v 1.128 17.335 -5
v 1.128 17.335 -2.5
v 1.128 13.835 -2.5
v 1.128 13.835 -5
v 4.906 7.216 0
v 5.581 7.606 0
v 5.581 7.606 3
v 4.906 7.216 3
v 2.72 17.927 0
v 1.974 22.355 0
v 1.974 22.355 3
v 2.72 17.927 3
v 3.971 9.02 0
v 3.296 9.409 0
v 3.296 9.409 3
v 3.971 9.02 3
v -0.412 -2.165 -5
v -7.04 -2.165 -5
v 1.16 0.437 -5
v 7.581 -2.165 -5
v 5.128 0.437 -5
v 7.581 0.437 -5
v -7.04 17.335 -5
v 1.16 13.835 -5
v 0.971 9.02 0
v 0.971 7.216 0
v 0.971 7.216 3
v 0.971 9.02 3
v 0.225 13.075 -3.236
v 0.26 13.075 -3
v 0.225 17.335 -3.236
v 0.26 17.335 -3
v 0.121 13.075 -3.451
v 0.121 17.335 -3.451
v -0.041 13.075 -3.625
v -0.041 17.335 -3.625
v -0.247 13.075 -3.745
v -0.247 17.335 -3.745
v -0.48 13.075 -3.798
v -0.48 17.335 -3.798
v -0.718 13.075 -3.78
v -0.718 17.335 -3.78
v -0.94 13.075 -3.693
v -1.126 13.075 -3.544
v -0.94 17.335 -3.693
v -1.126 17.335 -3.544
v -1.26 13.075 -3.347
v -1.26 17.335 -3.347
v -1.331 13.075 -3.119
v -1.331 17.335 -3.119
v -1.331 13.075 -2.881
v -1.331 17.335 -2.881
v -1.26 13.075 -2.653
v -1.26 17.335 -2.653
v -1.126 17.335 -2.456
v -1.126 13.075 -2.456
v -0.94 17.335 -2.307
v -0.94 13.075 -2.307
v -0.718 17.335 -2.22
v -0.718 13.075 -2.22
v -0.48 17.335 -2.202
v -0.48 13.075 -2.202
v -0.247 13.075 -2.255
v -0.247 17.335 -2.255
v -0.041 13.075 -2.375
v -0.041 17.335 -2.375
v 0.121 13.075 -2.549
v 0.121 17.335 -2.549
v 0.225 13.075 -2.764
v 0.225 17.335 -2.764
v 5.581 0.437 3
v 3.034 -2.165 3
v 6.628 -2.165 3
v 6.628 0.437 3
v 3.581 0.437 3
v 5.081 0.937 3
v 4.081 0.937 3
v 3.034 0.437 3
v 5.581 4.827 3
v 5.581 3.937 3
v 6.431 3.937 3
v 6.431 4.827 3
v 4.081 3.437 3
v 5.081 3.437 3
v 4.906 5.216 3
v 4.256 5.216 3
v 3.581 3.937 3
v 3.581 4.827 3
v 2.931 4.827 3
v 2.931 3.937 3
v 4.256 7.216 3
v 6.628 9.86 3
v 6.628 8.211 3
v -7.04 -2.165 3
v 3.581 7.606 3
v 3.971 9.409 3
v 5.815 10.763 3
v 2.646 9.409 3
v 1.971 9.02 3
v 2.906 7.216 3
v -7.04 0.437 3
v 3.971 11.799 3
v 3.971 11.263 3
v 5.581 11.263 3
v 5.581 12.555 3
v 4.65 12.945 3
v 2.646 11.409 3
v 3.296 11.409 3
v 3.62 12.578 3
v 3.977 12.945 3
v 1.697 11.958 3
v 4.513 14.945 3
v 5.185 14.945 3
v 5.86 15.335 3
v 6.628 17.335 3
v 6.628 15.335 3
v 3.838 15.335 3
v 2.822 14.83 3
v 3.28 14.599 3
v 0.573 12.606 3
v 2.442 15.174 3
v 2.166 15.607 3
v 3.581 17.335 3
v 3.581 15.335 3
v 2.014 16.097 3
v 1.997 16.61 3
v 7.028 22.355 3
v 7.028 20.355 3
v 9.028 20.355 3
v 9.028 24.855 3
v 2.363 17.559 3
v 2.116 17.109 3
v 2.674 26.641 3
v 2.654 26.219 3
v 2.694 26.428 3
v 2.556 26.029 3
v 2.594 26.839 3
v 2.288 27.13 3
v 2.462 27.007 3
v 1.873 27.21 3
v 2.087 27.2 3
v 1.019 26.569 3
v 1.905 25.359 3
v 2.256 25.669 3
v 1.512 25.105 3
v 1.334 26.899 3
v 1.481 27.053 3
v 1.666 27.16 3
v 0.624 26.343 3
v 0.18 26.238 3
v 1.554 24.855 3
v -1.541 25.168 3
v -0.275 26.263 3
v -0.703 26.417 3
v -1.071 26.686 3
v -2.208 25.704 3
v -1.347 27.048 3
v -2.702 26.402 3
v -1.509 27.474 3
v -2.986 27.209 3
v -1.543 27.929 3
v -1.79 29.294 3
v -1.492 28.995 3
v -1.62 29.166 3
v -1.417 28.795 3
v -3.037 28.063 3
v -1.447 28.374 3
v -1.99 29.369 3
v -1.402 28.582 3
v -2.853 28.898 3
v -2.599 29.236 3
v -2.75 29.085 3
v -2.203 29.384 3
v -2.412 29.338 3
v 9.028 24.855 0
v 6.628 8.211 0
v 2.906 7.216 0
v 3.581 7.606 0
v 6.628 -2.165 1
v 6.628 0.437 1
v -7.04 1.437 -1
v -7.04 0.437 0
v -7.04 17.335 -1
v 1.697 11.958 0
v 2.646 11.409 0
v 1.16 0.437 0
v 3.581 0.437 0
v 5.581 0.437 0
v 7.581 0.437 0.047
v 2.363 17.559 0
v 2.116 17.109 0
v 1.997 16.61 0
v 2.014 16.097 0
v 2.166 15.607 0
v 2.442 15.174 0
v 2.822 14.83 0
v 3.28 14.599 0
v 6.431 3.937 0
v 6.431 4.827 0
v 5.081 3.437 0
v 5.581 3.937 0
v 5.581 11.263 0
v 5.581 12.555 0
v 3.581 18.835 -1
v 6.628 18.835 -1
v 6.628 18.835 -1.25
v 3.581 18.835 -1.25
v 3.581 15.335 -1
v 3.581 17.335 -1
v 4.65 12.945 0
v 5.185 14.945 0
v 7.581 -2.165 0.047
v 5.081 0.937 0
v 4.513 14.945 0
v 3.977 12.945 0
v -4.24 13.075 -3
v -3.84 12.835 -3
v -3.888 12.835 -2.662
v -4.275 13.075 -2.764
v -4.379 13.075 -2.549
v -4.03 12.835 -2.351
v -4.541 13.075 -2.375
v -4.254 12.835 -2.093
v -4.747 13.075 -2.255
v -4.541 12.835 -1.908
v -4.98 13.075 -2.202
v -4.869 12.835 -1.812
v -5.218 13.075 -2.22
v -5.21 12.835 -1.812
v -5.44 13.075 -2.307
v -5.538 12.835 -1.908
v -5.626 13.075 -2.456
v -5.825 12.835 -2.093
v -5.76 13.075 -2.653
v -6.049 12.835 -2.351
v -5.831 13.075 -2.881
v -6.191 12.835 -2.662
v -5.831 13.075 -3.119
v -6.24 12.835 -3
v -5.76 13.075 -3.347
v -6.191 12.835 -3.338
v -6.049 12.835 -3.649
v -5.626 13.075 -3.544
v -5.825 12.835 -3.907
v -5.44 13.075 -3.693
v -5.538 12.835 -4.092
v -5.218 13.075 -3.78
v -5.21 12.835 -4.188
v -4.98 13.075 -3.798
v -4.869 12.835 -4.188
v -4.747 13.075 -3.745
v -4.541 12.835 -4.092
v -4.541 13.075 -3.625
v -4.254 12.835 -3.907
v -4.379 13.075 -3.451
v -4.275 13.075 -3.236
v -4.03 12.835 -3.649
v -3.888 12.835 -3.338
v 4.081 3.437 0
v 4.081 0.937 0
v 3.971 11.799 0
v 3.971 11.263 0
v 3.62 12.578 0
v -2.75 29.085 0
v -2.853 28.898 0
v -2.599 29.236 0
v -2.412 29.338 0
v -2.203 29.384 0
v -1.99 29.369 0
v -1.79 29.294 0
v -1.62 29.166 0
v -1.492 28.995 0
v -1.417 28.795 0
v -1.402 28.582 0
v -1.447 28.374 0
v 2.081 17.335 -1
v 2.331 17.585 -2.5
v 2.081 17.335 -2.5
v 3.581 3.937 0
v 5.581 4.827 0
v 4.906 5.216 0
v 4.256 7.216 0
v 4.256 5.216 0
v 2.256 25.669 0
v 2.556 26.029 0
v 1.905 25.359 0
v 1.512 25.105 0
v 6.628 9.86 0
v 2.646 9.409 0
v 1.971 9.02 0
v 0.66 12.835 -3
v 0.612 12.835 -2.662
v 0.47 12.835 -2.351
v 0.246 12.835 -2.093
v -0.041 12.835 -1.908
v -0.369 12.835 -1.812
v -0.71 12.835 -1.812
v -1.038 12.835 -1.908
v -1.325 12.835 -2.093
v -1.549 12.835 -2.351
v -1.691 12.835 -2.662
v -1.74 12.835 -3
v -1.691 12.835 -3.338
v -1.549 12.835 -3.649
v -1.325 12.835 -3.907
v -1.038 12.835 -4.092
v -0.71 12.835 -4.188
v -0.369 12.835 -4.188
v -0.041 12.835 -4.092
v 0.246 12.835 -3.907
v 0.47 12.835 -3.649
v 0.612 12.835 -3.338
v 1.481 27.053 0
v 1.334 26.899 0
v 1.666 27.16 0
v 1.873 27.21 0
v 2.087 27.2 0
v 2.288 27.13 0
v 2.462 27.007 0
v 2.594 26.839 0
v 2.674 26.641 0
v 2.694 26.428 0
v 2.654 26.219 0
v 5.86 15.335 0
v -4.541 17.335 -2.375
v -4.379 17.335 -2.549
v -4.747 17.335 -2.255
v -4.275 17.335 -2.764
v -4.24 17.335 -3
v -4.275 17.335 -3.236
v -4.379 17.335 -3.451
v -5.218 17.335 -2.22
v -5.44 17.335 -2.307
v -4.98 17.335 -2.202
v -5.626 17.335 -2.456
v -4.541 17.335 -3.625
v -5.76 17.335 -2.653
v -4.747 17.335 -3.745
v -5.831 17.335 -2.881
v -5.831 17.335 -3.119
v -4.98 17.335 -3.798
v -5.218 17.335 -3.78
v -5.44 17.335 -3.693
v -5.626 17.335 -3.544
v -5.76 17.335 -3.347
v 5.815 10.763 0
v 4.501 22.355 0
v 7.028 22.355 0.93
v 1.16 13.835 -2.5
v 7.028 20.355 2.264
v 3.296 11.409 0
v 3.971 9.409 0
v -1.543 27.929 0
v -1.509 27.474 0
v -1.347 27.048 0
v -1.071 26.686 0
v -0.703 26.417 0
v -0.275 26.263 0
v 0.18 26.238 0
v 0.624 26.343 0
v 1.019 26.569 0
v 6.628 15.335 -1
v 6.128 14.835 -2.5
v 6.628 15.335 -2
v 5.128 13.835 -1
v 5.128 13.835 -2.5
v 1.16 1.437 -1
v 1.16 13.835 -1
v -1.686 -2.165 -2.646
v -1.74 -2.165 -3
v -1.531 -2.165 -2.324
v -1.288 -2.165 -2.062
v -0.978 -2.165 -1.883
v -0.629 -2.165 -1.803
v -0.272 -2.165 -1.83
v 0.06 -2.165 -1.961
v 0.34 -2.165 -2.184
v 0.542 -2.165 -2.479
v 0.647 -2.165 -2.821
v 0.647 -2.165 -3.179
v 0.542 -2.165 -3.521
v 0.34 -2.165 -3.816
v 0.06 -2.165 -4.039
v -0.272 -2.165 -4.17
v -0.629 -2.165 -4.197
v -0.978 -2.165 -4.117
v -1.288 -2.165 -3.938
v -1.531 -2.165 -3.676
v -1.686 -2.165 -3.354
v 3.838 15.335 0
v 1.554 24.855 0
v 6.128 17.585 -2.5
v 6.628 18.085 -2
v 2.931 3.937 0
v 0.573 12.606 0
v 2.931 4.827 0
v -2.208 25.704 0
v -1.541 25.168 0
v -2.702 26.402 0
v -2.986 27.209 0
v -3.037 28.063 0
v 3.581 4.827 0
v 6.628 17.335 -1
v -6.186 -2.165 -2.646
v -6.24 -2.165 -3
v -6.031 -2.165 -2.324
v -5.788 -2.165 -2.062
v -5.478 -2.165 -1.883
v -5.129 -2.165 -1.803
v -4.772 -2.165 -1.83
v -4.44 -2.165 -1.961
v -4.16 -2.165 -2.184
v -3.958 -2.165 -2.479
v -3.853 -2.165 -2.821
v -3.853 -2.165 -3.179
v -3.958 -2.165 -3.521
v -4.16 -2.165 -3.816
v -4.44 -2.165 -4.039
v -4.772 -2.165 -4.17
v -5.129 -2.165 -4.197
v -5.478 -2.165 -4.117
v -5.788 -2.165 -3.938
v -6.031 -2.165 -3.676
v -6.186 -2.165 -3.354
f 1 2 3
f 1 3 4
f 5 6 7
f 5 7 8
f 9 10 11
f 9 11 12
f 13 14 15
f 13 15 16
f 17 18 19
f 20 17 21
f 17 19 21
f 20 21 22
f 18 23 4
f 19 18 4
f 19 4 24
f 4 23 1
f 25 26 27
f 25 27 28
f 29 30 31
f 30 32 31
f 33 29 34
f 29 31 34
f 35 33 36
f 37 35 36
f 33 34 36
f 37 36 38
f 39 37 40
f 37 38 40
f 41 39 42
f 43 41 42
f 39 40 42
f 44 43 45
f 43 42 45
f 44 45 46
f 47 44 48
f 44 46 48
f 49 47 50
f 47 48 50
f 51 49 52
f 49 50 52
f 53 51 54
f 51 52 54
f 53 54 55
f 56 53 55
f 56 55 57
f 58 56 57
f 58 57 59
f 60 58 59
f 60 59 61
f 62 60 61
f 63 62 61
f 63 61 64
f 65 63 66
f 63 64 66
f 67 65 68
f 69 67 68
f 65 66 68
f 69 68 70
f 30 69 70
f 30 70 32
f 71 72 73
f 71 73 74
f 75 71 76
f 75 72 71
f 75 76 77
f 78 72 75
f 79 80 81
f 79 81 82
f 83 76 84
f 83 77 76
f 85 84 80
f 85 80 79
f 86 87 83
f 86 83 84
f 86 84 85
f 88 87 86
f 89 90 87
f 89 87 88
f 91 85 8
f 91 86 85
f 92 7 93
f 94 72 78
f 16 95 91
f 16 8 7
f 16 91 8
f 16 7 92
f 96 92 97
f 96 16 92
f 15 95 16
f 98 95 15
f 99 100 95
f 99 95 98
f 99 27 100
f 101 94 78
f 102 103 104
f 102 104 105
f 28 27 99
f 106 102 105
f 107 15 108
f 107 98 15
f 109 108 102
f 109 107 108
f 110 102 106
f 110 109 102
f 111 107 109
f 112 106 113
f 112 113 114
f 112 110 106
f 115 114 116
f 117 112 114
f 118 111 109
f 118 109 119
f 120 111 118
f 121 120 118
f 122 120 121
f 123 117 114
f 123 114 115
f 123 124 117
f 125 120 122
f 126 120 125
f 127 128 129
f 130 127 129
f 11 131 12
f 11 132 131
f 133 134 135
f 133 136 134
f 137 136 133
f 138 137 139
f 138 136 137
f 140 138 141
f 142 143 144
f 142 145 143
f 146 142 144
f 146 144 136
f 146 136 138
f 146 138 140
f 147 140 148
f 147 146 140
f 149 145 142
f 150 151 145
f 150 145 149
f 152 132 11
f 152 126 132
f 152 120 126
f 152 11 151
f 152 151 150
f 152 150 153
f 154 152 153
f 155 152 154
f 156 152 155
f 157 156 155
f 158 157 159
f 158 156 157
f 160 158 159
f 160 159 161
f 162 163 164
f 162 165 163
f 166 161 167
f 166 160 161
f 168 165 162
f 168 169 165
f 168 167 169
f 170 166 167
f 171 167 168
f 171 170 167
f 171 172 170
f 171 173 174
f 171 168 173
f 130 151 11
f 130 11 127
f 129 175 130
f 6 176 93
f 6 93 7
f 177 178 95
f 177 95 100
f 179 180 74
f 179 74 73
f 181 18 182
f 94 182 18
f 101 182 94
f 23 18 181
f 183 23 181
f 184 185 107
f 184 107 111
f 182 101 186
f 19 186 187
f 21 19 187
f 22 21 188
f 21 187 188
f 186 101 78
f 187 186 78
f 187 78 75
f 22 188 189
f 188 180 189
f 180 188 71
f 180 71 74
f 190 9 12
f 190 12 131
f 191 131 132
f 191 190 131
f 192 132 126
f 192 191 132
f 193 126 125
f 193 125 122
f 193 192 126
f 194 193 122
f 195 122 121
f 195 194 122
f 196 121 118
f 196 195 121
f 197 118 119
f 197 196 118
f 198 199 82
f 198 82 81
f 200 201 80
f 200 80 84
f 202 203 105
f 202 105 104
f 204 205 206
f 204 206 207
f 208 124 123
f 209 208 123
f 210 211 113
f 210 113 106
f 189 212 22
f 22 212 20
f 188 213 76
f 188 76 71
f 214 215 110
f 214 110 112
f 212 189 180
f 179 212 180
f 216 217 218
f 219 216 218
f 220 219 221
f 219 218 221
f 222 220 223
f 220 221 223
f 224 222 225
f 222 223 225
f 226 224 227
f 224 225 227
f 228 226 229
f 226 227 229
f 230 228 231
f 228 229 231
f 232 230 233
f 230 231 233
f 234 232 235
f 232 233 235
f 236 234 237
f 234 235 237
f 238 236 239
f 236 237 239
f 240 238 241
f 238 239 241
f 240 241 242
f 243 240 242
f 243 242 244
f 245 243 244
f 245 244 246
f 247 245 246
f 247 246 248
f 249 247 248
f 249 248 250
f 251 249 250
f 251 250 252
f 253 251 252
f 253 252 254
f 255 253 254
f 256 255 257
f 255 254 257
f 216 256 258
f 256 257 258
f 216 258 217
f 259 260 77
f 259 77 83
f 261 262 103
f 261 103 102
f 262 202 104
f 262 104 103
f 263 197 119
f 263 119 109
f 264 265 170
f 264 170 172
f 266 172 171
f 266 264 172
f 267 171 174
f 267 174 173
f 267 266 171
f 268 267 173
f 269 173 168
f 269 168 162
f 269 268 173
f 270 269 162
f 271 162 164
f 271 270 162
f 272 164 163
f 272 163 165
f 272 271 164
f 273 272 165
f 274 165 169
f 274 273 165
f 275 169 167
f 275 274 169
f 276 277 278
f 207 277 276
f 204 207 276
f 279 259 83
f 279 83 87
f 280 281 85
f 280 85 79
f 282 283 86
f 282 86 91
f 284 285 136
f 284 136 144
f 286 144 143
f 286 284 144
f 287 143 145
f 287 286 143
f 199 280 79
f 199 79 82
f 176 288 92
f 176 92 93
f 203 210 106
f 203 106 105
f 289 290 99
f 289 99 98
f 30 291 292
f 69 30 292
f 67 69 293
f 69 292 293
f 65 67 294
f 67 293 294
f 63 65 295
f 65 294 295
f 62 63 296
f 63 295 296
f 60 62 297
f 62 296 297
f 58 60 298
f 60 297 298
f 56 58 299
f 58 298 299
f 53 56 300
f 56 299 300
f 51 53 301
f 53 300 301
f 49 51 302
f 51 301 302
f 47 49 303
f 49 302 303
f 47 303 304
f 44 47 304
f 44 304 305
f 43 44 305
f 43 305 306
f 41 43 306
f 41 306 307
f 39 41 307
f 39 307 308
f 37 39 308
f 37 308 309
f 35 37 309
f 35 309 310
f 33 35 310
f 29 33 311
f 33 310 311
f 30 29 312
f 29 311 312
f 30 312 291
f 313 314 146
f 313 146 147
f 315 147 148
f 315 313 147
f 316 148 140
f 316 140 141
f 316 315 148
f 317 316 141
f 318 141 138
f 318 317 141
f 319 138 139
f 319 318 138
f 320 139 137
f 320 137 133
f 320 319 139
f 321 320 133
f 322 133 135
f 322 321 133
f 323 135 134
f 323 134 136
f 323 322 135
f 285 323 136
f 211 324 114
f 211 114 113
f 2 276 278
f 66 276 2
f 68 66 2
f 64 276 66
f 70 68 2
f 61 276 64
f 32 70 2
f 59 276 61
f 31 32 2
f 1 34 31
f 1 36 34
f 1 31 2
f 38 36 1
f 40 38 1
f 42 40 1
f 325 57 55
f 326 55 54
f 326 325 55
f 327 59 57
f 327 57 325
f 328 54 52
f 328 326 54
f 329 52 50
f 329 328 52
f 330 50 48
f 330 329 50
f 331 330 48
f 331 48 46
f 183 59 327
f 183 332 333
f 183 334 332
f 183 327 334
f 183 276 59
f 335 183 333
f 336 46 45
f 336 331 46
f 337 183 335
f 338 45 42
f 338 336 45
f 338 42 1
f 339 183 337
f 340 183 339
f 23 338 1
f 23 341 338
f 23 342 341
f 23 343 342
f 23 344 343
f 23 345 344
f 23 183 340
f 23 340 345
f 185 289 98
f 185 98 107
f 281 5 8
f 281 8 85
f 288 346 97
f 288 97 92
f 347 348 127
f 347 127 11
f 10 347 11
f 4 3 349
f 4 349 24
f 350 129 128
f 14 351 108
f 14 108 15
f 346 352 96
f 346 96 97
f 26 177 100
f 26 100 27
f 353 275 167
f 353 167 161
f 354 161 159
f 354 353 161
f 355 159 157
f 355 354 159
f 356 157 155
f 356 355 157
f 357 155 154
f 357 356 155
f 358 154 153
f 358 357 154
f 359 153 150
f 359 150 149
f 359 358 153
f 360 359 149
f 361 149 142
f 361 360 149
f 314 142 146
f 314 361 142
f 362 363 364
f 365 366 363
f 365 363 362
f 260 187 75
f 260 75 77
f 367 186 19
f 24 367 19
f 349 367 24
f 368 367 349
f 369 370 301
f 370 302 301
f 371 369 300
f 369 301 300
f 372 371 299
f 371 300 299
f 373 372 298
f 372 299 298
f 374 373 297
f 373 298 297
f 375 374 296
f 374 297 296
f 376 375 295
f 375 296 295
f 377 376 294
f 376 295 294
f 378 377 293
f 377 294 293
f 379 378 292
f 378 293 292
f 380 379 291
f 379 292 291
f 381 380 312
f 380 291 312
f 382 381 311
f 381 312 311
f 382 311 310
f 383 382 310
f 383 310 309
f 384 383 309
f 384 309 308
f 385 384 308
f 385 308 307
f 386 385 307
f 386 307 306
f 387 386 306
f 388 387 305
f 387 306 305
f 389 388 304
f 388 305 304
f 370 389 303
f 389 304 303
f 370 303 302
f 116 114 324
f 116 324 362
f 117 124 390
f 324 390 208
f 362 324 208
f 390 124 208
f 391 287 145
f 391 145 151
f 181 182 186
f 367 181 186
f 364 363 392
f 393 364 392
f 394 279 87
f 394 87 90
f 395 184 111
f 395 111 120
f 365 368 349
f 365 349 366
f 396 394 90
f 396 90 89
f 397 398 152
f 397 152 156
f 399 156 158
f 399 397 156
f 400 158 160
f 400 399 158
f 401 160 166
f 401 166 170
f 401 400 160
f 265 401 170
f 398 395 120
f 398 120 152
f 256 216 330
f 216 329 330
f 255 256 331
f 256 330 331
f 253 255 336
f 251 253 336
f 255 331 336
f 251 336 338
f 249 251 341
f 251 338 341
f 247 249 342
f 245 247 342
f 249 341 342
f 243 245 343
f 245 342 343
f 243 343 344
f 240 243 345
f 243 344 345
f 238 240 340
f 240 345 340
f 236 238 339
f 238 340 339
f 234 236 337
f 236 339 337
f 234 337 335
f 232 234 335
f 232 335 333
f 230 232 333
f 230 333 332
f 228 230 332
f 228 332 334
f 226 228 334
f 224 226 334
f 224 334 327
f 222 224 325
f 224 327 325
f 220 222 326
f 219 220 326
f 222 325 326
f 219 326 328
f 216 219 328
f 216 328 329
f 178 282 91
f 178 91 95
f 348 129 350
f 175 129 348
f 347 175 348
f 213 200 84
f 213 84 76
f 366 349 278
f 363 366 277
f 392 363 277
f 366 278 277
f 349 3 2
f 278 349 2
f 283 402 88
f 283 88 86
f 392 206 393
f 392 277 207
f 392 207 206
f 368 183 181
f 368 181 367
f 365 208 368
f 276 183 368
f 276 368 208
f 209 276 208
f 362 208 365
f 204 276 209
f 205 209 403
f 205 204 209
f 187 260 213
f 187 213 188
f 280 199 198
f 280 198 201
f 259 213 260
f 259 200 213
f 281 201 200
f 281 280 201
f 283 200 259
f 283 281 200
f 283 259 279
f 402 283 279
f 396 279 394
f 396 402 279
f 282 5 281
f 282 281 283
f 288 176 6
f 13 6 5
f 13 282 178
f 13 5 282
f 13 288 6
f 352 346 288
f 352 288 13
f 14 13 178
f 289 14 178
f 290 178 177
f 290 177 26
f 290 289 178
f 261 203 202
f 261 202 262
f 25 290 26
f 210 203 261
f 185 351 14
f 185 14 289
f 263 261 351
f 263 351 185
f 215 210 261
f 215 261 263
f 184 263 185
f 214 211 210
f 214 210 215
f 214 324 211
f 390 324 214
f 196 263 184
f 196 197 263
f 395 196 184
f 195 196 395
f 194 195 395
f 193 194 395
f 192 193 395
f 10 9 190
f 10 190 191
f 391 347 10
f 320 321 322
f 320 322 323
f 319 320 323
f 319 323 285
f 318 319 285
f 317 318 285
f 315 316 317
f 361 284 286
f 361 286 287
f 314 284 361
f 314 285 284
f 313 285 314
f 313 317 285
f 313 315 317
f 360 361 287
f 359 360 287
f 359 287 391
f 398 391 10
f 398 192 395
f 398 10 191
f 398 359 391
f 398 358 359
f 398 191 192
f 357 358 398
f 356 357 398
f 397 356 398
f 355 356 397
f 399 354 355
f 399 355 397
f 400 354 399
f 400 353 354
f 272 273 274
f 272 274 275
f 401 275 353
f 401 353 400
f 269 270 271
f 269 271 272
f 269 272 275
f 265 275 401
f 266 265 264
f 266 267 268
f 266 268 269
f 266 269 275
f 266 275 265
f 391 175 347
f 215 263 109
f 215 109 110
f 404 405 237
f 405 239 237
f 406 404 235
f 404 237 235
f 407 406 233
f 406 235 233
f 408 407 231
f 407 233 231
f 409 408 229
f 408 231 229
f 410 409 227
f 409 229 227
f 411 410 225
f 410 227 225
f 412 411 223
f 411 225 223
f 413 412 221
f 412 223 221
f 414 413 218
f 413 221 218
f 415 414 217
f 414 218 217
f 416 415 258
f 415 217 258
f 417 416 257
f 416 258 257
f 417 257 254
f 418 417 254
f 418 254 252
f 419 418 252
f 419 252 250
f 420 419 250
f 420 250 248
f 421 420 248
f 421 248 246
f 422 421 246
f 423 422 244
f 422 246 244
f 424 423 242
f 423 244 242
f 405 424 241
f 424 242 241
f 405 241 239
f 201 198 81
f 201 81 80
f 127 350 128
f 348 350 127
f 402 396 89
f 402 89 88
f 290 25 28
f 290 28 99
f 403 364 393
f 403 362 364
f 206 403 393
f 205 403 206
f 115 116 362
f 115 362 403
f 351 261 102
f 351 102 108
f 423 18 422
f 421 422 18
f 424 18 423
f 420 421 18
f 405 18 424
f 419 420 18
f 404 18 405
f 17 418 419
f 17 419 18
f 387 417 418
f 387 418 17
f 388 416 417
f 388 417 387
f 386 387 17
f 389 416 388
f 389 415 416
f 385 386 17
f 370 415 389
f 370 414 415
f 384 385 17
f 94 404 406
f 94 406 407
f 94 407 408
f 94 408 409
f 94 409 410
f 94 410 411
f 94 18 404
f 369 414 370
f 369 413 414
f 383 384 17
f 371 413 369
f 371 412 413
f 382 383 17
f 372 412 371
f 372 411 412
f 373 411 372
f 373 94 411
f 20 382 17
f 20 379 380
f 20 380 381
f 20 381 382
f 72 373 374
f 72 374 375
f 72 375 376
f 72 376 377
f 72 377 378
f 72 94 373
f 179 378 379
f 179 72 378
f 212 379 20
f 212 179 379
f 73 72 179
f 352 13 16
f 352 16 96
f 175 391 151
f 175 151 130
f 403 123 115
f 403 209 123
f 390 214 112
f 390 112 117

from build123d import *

# Parameters (mm, degrees)
BOSS_SWITCH_BODY_DEPTH                    = 3
SKETCH1_W                                 = 4
SKETCH1_H                                 = 3.5
BOSS_FLANGE_WIDTH_DEPTH                   = 5
BOSS_FLANGE_HEIGHT_REACH                  = 35.863
SKETCH2_W                                 = 4
SKETCH2_H                                 = 2
SKETCH2_W_2                               = 8
SKETCH2_H_2                               = 2.602328973
CUT_UP_TO_DOWN_DERAILLEUR_CLEARANCE_REACH = 22.316
SKETCH10_W                                = 2.453096586
SKETCH10_H                                = 3
SKETCH17_W                                = 12.1675
SKETCH17_H                                = 4
BOSS_FLANGE_SUPPORT_DEPTH                 = 14.897671027
TAP_DRILL_FOR_M2X0_4_TAP1_D               = 1.6
M2_CLEARANCE_HOLE2_D                      = 2.4
M2_CLEARANCE_HOLE2_DEPTH                  = 15
M2_CLEARANCE_HOLE2_TIP                    = 0.721032743
CHAMFER_FLANGE_SUPPORT_SIZE               = 1.5
CHAMFER_FLANGE_SUPPORT_2_SIZE             = 1.5
SKETCH23_W                                = 3.9675
SKETCH23_H                                = 13.397671027
CUT_GAP_FOR_PRINTING_DEPTH                = 32.000499688
CHAMFER_FLANGE_SUPPORT_3_SIZE             = 1
SKETCH25_W                                = 0.953096586
SKETCH25_H                                = 3.5
CUT_DERAILLEUR_CLEARANCE_DEPTH            = 32.145320369
CHAMFER8_SIZE                             = 1
CUT_UP_TO_DOWN_CANTILEVER_SLOPE_REACH     = 31.869
SKETCH26_W                                = 12.477246204
SKETCH26_H                                = 5.771077126
CUT_WIDE_DERAILLEUR_CLEARANCE_DEPTH       = 33.195879702
CUT_WIDE_DERAILLEUR_CLEARANCE_DEPTH_BACK  = 4
SKETCH27_W                                = 2.5
SKETCH27_H                                = 5.000000046
CHAMFER9_SIZE                             = 1.25
SKETCH28_W                                = 3.046903414
SKETCH28_H                                = 1.5
CUT_EXTRUDE1_DEPTH                        = 1


# Some blends are built 0.0001 mm under size
with BuildPart() as part:
    # Sketch-SwitchBossUp → Boss-Switch Body (new body)
    with BuildSketch(Plane.XY):
        with BuildLine():
            Line((5.581091201, 12.55524379), (5.581100766, 11.263016279))
            Line((5.581100766, 11.263016279), (3.971265023, 11.263016279))
            Line((3.971265023, 11.263016279), (3.97126394, 11.79911022))
            Line((3.97126394, 11.79911022), (3.296271341, 11.409403061))
            Line((3.296271341, 11.409403061), (3.296271341, 9.409403061))
            Line((3.296271341, 9.409403061), (3.971278743, 9.019687356))
            Line((3.971278743, 9.019687356), (3.971278743, 9.409408058))
            Line((3.971278743, 9.409408058), (5.815189336, 10.763016279))
            Line((5.815189336, 10.763016279), (6.627976927, 9.860324207))
            Line((6.627976927, 9.860324207), (6.627976927, 8.210536505))
            Line((6.627976927, 8.210536505), (5.581127833, 7.606137899))
            Line((5.581127833, 7.606137899), (4.906138119, 7.216432406))
            Line((4.906138119, 7.216432406), (4.906138119, 5.216432406))
            Line((4.906138119, 5.216432406), (5.58114552, 4.826716701))
            Line((5.58114552, 4.826716701), (6.430577026, 4.826716701))
            Line((6.430577026, 4.826716701), (6.430577026, 3.937018274))
            Line((6.430577026, 3.937018274), (5.581138119, 3.937018274))
            Line((5.581138119, 3.937018274), (5.081138119, 3.437018274))
            Line((5.081138119, 3.437018274), (5.081138119, 0.937018274))
            Line((5.081138119, 0.937018274), (5.581138119, 0.437018274))
            Line((5.581138119, 0.437018274), (6.627976927, 0.437018274))
            Line((6.627976927, 0.437018274), (6.627976927, -2.165310699))
            Line((6.627976927, -2.165310699), (3.034464198, -2.165310699))
            Line((3.034464198, -2.165310699), (3.034464198, 0.437018274))
            Line((3.034464198, 0.437018274), (3.581138119, 0.437018274))
            Line((3.581138119, 0.437018274), (4.081138119, 0.937018274))
            Line((4.081138119, 0.937018274), (4.081138119, 3.437018274))
            Line((4.081138119, 3.437018274), (3.581138119, 3.937018274))
            Line((3.581138119, 3.937018274), (2.930577026, 3.937018274))
            Line((2.930577026, 3.937018274), (2.930577026, 4.826720436))
            Line((2.930577026, 4.826720436), (3.58114552, 4.826720436))
            Line((3.58114552, 4.826720436), (4.256138119, 5.216427595))
            Line((4.256138119, 5.216427595), (4.256138119, 7.216427595))
            Line((4.256138119, 7.216427595), (3.581130717, 7.6061433))
            Line((3.581130717, 7.6061433), (2.9061262, 7.216422599))
            Line((2.9061262, 7.216422599), (0.971281627, 7.216422599))
            Line((0.971281627, 7.216422599), (0.971281627, 9.019692757))
            Line((0.971281627, 9.019692757), (1.971281627, 9.019692757))
            Line((1.971281627, 9.019692757), (2.646271341, 9.40939825))
            Line((2.646271341, 9.40939825), (2.646271341, 11.40939825))
            Line((2.646271341, 11.40939825), (1.696557212, 11.957715958))
            Line((1.696557212, 11.957715958), (0.573317845, 12.60621851))
            Line((0.573317845, 12.60621851), (-1.541303694, 25.167805745))
            ThreePointArc((-1.541303694, 25.167805745), (-2.872284003, 26.795385437), (-2.852546321, 28.897797067))
            ThreePointArc((-2.852546321, 28.897797067), (-1.887813913, 29.338582026), (-1.447028953, 28.373849618))
            ThreePointArc((-1.447028953, 28.373849618), (-0.703448682, 26.416936722), (1.333779254, 26.898727173))
            ThreePointArc((1.333779254, 26.898727173), (2.379722745, 27.074801628), (2.555797201, 26.028858137))
            ThreePointArc((2.555797201, 26.028858137), (2.086504637, 25.507104397), (1.511513111, 25.104801997))
            Line((1.511513111, 25.104801997), (1.553598189, 24.854801997))
            Line((1.553598189, 24.854801997), (9.027976927, 24.854801997))
            Line((9.027976927, 24.854801997), (9.027976927, 22.354801997))
            Line((9.027976927, 22.354801997), (9.027976927, 20.354801997))
            Line((9.027976927, 20.354801997), (7.027976927, 20.354801997))
            Line((7.027976927, 20.354801997), (7.027976927, 22.354801997))
            Line((7.027976927, 22.354801997), (1.974448974, 22.354801997))
            Line((1.974448974, 22.354801997), (2.719778232, 17.927287042))
            ThreePointArc((2.719778232, 17.927287042), (2.013826204, 16.096957693), (3.280124137, 14.598637521))
            Line((3.280124137, 14.598637521), (3.620297651, 12.577888564))
            Line((3.620297651, 12.577888564), (3.976674365, 12.944956135))
            Line((3.976674365, 12.944956135), (4.512557947, 14.944960101))
            Line((4.512557947, 14.944960101), (3.837515632, 15.334689301))
            Line((3.837515632, 15.334689301), (3.581073513, 15.334689301))
            Line((3.581073513, 15.334689301), (3.581073513, 17.334689301))
            Line((3.581073513, 17.334689301), (5.725580434, 17.334689301))
            Line((5.725580434, 17.334689301), (6.627976927, 17.334689301))
            Line((6.627976927, 17.334689301), (6.627976927, 15.334689301))
            Line((6.627976927, 15.334689301), (5.860498075, 15.334689301))
            Line((5.860498075, 15.334689301), (5.185487464, 14.944965082))
            Line((5.185487464, 14.944965082), (4.649603883, 12.944961115))
            Line((4.649603883, 12.944961115), (5.581091201, 12.55524379))
        make_face()
    extrude(amount=BOSS_SWITCH_BODY_DEPTH)

    # Sketch1 → Boss-Flange Width (add)
    with BuildSketch(Plane(origin=(0, 0, 0), x_dir=(-1, 0, 0), z_dir=(0, 0, -1))):
        Polygon((-7.581073513, -2.165310699), (0.412170615, -2.165310699), (0.412170615, 0.437018274), (-3.034464198, 0.437018274), (-3.581138119, 0.437018274), (-5.081138119, 0.437018274), (-6.627976927, 0.437018274), (-7.581073513, 0.437018274), align=None)
        with Locations((-5.581073513, 17.084689301)):
            Rectangle(SKETCH1_W, SKETCH1_H)
    extrude(amount=BOSS_FLANGE_WIDTH_DEPTH)

    # Sketch2 → Boss-Flange Height (add, up to next)
    with BuildSketch(Plane(origin=(-7.039523073, 0, 0), x_dir=(0, 0, -1), z_dir=(1, 0, 0)), mode=Mode.PRIVATE) as boss_flange_height_sk1:
        with Locations((3, 16.334689301)):
            Rectangle(SKETCH2_W, SKETCH2_H)
    boss_flange_height_tool1 = extrude(boss_flange_height_sk1.sketch, amount=BOSS_FLANGE_HEIGHT_REACH, mode=Mode.PRIVATE) - part.part
    # Sketch2 → Boss-Flange Height (add, up to next)
    with BuildSketch(Plane(origin=(-7.039523073, 0, 0), x_dir=(0, 0, -1), z_dir=(1, 0, 0)), mode=Mode.PRIVATE) as boss_flange_height_sk2:
        with Locations((1, -0.864146212)):
            Rectangle(SKETCH2_W_2, SKETCH2_H_2)
    boss_flange_height_tool2 = extrude(boss_flange_height_sk2.sketch, amount=BOSS_FLANGE_HEIGHT_REACH, mode=Mode.PRIVATE) - part.part
    add(boss_flange_height_tool1.solids().sort_by_distance((-7.039523, 16.334689, -3))[0])
    add(boss_flange_height_tool2.solids().sort_by_distance((-7.039523, -0.864146, -1))[0])

    # Sketch10 → Cut-Up-To-Down Derailleur Clearance (cut, up to next)
    with BuildSketch(Plane(origin=(0, 15.334689301, 0), x_dir=(1, 0, 0), z_dir=(0, 1, 0)), mode=Mode.PRIVATE) as cut_up_to_down_derailleur_clearance_sk1:
        with Locations((6.35452522, 3.5)):
            Rectangle(SKETCH10_W, SKETCH10_H)
    cut_up_to_down_derailleur_clearance_tool1 = extrude(cut_up_to_down_derailleur_clearance_sk1.sketch, amount=CUT_UP_TO_DOWN_DERAILLEUR_CLEARANCE_REACH, mode=Mode.PRIVATE) & part.part
    add(cut_up_to_down_derailleur_clearance_tool1.solids().sort_by_distance((6.354525, 15.334689, -3.5))[0], mode=Mode.SUBTRACT)

    # Sketch17 → Boss-Flange Support (add)
    with BuildSketch(Plane.XZ.offset(-15.334689301)):
        with Locations((-0.955773073, -3)):
            Rectangle(SKETCH17_W, SKETCH17_H)
    extrude(amount=BOSS_FLANGE_SUPPORT_DEPTH)

    # Tap Drill for M2x0.4 Tap1 (through all)
    with Locations(Plane(origin=(0, -2.165310699, 0), x_dir=(-1, 0, 0), z_dir=(0, -1, 0))):
        with Locations((5.039523073, 3), (0.539523073, 3)):
            Hole(TAP_DRILL_FOR_M2X0_4_TAP1_D / 2)

    # M2 Clearance Hole2
    with Locations(Plane.XZ.offset(2.165310699)):
        with Locations((-5.039523073, -3), (-0.539523073, -3)):
            Hole(M2_CLEARANCE_HOLE2_D / 2, depth=M2_CLEARANCE_HOLE2_DEPTH)
            with Locations((0, 0, -(M2_CLEARANCE_HOLE2_DEPTH + M2_CLEARANCE_HOLE2_TIP / 2))):  # 118° drill point
                Cone(0, M2_CLEARANCE_HOLE2_D / 2, M2_CLEARANCE_HOLE2_TIP, mode=Mode.SUBTRACT)

    # Chamfer-Flange Support
    chamfer_flange_support_edges = [part.edges().sort_by_distance(p)[0] for p in [
        (3.581073513, 17.334689301, -3),
    ]]
    chamfer(chamfer_flange_support_edges, length=CHAMFER_FLANGE_SUPPORT_SIZE - 0.0001)  # a hair under: the kernel refuses the full size

    # Chamfer-Flange Support 2
    chamfer_flange_support_2_edges = [part.edges().sort_by_distance(p)[0] for p in [
        (5.127976927, 17.084689301, -2),
        (5.127976927, 15.334689301, -1.5),
    ]]
    chamfer(chamfer_flange_support_2_edges, length=CHAMFER_FLANGE_SUPPORT_2_SIZE)

    # Sketch23 → Cut-Gap for Printing (cut, through all)
    with BuildSketch(Plane.XY.offset(-1)):
        with Locations((3.144226927, 7.135853788)):
            Rectangle(SKETCH23_W, SKETCH23_H)
    extrude(amount=-CUT_GAP_FOR_PRINTING_DEPTH, mode=Mode.SUBTRACT)

    # Chamfer-Flange Support 3
    chamfer_flange_support_3_edges = [part.edges().sort_by_distance(p)[0] for p in [
        (-2.939523073, 0.437018274, -1),
    ]]
    chamfer(chamfer_flange_support_3_edges, length=CHAMFER_FLANGE_SUPPORT_3_SIZE)

    # Sketch25 → Cut-Derailleur Clearance (cut, through all)
    with BuildSketch(Plane.XY):
        with Locations((7.10452522, 17.084689301)):
            Rectangle(SKETCH25_W, SKETCH25_H)
    extrude(amount=-CUT_DERAILLEUR_CLEARANCE_DEPTH, mode=Mode.SUBTRACT)

    # Chamfer8
    # the kernel refuses this chamfer: 1 mm, written as the material it adds along each edge
    with BuildSketch(Plane(origin=(6.627976927, 0.437018274, 0), x_dir=(0.9996219169112968, 0, -0.027495876610586365), z_dir=(0, -1, 0))) as chamfer8_piece_1_section:
        Polygon((CHAMFER8_SIZE * 0.999621916911, CHAMFER8_SIZE * 0.0274958766106), (-CHAMFER8_SIZE * 0.0274958766106, CHAMFER8_SIZE * 0.999621916911), (0, 0), align=None)
    chamfer8_piece_1 = extrude(amount=2.602328973, mode=Mode.PRIVATE)
    chamfer8_piece_1 = split(chamfer8_piece_1, bisect_by=Plane(origin=(7.581073513, -0.864146212, 0.332375145), z_dir=(-1, 0, 0)), keep=Keep.TOP, mode=Mode.PRIVATE)
    add(chamfer8_piece_1)

    # Sketch26 → Cut-Up-to-Down Cantilever Slope (cut, up to next)
    with BuildSketch(Plane(origin=(-3.086642121, 5.589000146, 8.383500218), x_dir=(-0.9561404375276108, -0.1624764728289173, -0.24371470924337582), z_dir=(0.2929086269205964, -0.5303712883154423, -0.795556932473163)), mode=Mode.PRIVATE) as cut_up_to_down_cantilever_slope_sk1:
        with Locations((-13.791615152, 17.794906754)):
            Rectangle(SKETCH26_W, SKETCH26_H)
    cut_up_to_down_cantilever_slope_tool1 = extrude(cut_up_to_down_cantilever_slope_sk1.sketch, amount=CUT_UP_TO_DOWN_CANTILEVER_SLOPE_REACH, mode=Mode.PRIVATE) & part.part
    add(cut_up_to_down_cantilever_slope_tool1.solids().sort_by_distance((10.100079, 22.636071, 1.873881))[0], mode=Mode.SUBTRACT)

    # Sketch27 → Cut-Wide Derailleur Clearance (cut, two sides: drawn at the far end of the back side and taken through both)
    with BuildSketch(Plane(origin=(5.127976927, 0, 0), x_dir=(0, 0, -1), z_dir=(1, 0, 0)).offset(-CUT_WIDE_DERAILLEUR_CLEARANCE_DEPTH_BACK)):
        with Locations((3.75, 16.334689324)):
            Rectangle(SKETCH27_W, SKETCH27_H)
    extrude(amount=CUT_WIDE_DERAILLEUR_CLEARANCE_DEPTH + CUT_WIDE_DERAILLEUR_CLEARANCE_DEPTH_BACK, mode=Mode.SUBTRACT)

    # Chamfer9
    chamfer9_edges = [part.edges().sort_by_distance(p)[0] for p in [
        (4.85452522, 18.834689347, -2.5),
    ]]
    chamfer(chamfer9_edges, length=CHAMFER9_SIZE)

    # Sketch28 → Cut-Extrude1 (cut)
    with BuildSketch(Plane.XY.offset(-1)):
        with Locations((5.10452522, 18.084689301)):
            Rectangle(SKETCH28_W, SKETCH28_H)
    extrude(amount=CUT_EXTRUDE1_DEPTH, mode=Mode.SUBTRACT)


solid = part.part
